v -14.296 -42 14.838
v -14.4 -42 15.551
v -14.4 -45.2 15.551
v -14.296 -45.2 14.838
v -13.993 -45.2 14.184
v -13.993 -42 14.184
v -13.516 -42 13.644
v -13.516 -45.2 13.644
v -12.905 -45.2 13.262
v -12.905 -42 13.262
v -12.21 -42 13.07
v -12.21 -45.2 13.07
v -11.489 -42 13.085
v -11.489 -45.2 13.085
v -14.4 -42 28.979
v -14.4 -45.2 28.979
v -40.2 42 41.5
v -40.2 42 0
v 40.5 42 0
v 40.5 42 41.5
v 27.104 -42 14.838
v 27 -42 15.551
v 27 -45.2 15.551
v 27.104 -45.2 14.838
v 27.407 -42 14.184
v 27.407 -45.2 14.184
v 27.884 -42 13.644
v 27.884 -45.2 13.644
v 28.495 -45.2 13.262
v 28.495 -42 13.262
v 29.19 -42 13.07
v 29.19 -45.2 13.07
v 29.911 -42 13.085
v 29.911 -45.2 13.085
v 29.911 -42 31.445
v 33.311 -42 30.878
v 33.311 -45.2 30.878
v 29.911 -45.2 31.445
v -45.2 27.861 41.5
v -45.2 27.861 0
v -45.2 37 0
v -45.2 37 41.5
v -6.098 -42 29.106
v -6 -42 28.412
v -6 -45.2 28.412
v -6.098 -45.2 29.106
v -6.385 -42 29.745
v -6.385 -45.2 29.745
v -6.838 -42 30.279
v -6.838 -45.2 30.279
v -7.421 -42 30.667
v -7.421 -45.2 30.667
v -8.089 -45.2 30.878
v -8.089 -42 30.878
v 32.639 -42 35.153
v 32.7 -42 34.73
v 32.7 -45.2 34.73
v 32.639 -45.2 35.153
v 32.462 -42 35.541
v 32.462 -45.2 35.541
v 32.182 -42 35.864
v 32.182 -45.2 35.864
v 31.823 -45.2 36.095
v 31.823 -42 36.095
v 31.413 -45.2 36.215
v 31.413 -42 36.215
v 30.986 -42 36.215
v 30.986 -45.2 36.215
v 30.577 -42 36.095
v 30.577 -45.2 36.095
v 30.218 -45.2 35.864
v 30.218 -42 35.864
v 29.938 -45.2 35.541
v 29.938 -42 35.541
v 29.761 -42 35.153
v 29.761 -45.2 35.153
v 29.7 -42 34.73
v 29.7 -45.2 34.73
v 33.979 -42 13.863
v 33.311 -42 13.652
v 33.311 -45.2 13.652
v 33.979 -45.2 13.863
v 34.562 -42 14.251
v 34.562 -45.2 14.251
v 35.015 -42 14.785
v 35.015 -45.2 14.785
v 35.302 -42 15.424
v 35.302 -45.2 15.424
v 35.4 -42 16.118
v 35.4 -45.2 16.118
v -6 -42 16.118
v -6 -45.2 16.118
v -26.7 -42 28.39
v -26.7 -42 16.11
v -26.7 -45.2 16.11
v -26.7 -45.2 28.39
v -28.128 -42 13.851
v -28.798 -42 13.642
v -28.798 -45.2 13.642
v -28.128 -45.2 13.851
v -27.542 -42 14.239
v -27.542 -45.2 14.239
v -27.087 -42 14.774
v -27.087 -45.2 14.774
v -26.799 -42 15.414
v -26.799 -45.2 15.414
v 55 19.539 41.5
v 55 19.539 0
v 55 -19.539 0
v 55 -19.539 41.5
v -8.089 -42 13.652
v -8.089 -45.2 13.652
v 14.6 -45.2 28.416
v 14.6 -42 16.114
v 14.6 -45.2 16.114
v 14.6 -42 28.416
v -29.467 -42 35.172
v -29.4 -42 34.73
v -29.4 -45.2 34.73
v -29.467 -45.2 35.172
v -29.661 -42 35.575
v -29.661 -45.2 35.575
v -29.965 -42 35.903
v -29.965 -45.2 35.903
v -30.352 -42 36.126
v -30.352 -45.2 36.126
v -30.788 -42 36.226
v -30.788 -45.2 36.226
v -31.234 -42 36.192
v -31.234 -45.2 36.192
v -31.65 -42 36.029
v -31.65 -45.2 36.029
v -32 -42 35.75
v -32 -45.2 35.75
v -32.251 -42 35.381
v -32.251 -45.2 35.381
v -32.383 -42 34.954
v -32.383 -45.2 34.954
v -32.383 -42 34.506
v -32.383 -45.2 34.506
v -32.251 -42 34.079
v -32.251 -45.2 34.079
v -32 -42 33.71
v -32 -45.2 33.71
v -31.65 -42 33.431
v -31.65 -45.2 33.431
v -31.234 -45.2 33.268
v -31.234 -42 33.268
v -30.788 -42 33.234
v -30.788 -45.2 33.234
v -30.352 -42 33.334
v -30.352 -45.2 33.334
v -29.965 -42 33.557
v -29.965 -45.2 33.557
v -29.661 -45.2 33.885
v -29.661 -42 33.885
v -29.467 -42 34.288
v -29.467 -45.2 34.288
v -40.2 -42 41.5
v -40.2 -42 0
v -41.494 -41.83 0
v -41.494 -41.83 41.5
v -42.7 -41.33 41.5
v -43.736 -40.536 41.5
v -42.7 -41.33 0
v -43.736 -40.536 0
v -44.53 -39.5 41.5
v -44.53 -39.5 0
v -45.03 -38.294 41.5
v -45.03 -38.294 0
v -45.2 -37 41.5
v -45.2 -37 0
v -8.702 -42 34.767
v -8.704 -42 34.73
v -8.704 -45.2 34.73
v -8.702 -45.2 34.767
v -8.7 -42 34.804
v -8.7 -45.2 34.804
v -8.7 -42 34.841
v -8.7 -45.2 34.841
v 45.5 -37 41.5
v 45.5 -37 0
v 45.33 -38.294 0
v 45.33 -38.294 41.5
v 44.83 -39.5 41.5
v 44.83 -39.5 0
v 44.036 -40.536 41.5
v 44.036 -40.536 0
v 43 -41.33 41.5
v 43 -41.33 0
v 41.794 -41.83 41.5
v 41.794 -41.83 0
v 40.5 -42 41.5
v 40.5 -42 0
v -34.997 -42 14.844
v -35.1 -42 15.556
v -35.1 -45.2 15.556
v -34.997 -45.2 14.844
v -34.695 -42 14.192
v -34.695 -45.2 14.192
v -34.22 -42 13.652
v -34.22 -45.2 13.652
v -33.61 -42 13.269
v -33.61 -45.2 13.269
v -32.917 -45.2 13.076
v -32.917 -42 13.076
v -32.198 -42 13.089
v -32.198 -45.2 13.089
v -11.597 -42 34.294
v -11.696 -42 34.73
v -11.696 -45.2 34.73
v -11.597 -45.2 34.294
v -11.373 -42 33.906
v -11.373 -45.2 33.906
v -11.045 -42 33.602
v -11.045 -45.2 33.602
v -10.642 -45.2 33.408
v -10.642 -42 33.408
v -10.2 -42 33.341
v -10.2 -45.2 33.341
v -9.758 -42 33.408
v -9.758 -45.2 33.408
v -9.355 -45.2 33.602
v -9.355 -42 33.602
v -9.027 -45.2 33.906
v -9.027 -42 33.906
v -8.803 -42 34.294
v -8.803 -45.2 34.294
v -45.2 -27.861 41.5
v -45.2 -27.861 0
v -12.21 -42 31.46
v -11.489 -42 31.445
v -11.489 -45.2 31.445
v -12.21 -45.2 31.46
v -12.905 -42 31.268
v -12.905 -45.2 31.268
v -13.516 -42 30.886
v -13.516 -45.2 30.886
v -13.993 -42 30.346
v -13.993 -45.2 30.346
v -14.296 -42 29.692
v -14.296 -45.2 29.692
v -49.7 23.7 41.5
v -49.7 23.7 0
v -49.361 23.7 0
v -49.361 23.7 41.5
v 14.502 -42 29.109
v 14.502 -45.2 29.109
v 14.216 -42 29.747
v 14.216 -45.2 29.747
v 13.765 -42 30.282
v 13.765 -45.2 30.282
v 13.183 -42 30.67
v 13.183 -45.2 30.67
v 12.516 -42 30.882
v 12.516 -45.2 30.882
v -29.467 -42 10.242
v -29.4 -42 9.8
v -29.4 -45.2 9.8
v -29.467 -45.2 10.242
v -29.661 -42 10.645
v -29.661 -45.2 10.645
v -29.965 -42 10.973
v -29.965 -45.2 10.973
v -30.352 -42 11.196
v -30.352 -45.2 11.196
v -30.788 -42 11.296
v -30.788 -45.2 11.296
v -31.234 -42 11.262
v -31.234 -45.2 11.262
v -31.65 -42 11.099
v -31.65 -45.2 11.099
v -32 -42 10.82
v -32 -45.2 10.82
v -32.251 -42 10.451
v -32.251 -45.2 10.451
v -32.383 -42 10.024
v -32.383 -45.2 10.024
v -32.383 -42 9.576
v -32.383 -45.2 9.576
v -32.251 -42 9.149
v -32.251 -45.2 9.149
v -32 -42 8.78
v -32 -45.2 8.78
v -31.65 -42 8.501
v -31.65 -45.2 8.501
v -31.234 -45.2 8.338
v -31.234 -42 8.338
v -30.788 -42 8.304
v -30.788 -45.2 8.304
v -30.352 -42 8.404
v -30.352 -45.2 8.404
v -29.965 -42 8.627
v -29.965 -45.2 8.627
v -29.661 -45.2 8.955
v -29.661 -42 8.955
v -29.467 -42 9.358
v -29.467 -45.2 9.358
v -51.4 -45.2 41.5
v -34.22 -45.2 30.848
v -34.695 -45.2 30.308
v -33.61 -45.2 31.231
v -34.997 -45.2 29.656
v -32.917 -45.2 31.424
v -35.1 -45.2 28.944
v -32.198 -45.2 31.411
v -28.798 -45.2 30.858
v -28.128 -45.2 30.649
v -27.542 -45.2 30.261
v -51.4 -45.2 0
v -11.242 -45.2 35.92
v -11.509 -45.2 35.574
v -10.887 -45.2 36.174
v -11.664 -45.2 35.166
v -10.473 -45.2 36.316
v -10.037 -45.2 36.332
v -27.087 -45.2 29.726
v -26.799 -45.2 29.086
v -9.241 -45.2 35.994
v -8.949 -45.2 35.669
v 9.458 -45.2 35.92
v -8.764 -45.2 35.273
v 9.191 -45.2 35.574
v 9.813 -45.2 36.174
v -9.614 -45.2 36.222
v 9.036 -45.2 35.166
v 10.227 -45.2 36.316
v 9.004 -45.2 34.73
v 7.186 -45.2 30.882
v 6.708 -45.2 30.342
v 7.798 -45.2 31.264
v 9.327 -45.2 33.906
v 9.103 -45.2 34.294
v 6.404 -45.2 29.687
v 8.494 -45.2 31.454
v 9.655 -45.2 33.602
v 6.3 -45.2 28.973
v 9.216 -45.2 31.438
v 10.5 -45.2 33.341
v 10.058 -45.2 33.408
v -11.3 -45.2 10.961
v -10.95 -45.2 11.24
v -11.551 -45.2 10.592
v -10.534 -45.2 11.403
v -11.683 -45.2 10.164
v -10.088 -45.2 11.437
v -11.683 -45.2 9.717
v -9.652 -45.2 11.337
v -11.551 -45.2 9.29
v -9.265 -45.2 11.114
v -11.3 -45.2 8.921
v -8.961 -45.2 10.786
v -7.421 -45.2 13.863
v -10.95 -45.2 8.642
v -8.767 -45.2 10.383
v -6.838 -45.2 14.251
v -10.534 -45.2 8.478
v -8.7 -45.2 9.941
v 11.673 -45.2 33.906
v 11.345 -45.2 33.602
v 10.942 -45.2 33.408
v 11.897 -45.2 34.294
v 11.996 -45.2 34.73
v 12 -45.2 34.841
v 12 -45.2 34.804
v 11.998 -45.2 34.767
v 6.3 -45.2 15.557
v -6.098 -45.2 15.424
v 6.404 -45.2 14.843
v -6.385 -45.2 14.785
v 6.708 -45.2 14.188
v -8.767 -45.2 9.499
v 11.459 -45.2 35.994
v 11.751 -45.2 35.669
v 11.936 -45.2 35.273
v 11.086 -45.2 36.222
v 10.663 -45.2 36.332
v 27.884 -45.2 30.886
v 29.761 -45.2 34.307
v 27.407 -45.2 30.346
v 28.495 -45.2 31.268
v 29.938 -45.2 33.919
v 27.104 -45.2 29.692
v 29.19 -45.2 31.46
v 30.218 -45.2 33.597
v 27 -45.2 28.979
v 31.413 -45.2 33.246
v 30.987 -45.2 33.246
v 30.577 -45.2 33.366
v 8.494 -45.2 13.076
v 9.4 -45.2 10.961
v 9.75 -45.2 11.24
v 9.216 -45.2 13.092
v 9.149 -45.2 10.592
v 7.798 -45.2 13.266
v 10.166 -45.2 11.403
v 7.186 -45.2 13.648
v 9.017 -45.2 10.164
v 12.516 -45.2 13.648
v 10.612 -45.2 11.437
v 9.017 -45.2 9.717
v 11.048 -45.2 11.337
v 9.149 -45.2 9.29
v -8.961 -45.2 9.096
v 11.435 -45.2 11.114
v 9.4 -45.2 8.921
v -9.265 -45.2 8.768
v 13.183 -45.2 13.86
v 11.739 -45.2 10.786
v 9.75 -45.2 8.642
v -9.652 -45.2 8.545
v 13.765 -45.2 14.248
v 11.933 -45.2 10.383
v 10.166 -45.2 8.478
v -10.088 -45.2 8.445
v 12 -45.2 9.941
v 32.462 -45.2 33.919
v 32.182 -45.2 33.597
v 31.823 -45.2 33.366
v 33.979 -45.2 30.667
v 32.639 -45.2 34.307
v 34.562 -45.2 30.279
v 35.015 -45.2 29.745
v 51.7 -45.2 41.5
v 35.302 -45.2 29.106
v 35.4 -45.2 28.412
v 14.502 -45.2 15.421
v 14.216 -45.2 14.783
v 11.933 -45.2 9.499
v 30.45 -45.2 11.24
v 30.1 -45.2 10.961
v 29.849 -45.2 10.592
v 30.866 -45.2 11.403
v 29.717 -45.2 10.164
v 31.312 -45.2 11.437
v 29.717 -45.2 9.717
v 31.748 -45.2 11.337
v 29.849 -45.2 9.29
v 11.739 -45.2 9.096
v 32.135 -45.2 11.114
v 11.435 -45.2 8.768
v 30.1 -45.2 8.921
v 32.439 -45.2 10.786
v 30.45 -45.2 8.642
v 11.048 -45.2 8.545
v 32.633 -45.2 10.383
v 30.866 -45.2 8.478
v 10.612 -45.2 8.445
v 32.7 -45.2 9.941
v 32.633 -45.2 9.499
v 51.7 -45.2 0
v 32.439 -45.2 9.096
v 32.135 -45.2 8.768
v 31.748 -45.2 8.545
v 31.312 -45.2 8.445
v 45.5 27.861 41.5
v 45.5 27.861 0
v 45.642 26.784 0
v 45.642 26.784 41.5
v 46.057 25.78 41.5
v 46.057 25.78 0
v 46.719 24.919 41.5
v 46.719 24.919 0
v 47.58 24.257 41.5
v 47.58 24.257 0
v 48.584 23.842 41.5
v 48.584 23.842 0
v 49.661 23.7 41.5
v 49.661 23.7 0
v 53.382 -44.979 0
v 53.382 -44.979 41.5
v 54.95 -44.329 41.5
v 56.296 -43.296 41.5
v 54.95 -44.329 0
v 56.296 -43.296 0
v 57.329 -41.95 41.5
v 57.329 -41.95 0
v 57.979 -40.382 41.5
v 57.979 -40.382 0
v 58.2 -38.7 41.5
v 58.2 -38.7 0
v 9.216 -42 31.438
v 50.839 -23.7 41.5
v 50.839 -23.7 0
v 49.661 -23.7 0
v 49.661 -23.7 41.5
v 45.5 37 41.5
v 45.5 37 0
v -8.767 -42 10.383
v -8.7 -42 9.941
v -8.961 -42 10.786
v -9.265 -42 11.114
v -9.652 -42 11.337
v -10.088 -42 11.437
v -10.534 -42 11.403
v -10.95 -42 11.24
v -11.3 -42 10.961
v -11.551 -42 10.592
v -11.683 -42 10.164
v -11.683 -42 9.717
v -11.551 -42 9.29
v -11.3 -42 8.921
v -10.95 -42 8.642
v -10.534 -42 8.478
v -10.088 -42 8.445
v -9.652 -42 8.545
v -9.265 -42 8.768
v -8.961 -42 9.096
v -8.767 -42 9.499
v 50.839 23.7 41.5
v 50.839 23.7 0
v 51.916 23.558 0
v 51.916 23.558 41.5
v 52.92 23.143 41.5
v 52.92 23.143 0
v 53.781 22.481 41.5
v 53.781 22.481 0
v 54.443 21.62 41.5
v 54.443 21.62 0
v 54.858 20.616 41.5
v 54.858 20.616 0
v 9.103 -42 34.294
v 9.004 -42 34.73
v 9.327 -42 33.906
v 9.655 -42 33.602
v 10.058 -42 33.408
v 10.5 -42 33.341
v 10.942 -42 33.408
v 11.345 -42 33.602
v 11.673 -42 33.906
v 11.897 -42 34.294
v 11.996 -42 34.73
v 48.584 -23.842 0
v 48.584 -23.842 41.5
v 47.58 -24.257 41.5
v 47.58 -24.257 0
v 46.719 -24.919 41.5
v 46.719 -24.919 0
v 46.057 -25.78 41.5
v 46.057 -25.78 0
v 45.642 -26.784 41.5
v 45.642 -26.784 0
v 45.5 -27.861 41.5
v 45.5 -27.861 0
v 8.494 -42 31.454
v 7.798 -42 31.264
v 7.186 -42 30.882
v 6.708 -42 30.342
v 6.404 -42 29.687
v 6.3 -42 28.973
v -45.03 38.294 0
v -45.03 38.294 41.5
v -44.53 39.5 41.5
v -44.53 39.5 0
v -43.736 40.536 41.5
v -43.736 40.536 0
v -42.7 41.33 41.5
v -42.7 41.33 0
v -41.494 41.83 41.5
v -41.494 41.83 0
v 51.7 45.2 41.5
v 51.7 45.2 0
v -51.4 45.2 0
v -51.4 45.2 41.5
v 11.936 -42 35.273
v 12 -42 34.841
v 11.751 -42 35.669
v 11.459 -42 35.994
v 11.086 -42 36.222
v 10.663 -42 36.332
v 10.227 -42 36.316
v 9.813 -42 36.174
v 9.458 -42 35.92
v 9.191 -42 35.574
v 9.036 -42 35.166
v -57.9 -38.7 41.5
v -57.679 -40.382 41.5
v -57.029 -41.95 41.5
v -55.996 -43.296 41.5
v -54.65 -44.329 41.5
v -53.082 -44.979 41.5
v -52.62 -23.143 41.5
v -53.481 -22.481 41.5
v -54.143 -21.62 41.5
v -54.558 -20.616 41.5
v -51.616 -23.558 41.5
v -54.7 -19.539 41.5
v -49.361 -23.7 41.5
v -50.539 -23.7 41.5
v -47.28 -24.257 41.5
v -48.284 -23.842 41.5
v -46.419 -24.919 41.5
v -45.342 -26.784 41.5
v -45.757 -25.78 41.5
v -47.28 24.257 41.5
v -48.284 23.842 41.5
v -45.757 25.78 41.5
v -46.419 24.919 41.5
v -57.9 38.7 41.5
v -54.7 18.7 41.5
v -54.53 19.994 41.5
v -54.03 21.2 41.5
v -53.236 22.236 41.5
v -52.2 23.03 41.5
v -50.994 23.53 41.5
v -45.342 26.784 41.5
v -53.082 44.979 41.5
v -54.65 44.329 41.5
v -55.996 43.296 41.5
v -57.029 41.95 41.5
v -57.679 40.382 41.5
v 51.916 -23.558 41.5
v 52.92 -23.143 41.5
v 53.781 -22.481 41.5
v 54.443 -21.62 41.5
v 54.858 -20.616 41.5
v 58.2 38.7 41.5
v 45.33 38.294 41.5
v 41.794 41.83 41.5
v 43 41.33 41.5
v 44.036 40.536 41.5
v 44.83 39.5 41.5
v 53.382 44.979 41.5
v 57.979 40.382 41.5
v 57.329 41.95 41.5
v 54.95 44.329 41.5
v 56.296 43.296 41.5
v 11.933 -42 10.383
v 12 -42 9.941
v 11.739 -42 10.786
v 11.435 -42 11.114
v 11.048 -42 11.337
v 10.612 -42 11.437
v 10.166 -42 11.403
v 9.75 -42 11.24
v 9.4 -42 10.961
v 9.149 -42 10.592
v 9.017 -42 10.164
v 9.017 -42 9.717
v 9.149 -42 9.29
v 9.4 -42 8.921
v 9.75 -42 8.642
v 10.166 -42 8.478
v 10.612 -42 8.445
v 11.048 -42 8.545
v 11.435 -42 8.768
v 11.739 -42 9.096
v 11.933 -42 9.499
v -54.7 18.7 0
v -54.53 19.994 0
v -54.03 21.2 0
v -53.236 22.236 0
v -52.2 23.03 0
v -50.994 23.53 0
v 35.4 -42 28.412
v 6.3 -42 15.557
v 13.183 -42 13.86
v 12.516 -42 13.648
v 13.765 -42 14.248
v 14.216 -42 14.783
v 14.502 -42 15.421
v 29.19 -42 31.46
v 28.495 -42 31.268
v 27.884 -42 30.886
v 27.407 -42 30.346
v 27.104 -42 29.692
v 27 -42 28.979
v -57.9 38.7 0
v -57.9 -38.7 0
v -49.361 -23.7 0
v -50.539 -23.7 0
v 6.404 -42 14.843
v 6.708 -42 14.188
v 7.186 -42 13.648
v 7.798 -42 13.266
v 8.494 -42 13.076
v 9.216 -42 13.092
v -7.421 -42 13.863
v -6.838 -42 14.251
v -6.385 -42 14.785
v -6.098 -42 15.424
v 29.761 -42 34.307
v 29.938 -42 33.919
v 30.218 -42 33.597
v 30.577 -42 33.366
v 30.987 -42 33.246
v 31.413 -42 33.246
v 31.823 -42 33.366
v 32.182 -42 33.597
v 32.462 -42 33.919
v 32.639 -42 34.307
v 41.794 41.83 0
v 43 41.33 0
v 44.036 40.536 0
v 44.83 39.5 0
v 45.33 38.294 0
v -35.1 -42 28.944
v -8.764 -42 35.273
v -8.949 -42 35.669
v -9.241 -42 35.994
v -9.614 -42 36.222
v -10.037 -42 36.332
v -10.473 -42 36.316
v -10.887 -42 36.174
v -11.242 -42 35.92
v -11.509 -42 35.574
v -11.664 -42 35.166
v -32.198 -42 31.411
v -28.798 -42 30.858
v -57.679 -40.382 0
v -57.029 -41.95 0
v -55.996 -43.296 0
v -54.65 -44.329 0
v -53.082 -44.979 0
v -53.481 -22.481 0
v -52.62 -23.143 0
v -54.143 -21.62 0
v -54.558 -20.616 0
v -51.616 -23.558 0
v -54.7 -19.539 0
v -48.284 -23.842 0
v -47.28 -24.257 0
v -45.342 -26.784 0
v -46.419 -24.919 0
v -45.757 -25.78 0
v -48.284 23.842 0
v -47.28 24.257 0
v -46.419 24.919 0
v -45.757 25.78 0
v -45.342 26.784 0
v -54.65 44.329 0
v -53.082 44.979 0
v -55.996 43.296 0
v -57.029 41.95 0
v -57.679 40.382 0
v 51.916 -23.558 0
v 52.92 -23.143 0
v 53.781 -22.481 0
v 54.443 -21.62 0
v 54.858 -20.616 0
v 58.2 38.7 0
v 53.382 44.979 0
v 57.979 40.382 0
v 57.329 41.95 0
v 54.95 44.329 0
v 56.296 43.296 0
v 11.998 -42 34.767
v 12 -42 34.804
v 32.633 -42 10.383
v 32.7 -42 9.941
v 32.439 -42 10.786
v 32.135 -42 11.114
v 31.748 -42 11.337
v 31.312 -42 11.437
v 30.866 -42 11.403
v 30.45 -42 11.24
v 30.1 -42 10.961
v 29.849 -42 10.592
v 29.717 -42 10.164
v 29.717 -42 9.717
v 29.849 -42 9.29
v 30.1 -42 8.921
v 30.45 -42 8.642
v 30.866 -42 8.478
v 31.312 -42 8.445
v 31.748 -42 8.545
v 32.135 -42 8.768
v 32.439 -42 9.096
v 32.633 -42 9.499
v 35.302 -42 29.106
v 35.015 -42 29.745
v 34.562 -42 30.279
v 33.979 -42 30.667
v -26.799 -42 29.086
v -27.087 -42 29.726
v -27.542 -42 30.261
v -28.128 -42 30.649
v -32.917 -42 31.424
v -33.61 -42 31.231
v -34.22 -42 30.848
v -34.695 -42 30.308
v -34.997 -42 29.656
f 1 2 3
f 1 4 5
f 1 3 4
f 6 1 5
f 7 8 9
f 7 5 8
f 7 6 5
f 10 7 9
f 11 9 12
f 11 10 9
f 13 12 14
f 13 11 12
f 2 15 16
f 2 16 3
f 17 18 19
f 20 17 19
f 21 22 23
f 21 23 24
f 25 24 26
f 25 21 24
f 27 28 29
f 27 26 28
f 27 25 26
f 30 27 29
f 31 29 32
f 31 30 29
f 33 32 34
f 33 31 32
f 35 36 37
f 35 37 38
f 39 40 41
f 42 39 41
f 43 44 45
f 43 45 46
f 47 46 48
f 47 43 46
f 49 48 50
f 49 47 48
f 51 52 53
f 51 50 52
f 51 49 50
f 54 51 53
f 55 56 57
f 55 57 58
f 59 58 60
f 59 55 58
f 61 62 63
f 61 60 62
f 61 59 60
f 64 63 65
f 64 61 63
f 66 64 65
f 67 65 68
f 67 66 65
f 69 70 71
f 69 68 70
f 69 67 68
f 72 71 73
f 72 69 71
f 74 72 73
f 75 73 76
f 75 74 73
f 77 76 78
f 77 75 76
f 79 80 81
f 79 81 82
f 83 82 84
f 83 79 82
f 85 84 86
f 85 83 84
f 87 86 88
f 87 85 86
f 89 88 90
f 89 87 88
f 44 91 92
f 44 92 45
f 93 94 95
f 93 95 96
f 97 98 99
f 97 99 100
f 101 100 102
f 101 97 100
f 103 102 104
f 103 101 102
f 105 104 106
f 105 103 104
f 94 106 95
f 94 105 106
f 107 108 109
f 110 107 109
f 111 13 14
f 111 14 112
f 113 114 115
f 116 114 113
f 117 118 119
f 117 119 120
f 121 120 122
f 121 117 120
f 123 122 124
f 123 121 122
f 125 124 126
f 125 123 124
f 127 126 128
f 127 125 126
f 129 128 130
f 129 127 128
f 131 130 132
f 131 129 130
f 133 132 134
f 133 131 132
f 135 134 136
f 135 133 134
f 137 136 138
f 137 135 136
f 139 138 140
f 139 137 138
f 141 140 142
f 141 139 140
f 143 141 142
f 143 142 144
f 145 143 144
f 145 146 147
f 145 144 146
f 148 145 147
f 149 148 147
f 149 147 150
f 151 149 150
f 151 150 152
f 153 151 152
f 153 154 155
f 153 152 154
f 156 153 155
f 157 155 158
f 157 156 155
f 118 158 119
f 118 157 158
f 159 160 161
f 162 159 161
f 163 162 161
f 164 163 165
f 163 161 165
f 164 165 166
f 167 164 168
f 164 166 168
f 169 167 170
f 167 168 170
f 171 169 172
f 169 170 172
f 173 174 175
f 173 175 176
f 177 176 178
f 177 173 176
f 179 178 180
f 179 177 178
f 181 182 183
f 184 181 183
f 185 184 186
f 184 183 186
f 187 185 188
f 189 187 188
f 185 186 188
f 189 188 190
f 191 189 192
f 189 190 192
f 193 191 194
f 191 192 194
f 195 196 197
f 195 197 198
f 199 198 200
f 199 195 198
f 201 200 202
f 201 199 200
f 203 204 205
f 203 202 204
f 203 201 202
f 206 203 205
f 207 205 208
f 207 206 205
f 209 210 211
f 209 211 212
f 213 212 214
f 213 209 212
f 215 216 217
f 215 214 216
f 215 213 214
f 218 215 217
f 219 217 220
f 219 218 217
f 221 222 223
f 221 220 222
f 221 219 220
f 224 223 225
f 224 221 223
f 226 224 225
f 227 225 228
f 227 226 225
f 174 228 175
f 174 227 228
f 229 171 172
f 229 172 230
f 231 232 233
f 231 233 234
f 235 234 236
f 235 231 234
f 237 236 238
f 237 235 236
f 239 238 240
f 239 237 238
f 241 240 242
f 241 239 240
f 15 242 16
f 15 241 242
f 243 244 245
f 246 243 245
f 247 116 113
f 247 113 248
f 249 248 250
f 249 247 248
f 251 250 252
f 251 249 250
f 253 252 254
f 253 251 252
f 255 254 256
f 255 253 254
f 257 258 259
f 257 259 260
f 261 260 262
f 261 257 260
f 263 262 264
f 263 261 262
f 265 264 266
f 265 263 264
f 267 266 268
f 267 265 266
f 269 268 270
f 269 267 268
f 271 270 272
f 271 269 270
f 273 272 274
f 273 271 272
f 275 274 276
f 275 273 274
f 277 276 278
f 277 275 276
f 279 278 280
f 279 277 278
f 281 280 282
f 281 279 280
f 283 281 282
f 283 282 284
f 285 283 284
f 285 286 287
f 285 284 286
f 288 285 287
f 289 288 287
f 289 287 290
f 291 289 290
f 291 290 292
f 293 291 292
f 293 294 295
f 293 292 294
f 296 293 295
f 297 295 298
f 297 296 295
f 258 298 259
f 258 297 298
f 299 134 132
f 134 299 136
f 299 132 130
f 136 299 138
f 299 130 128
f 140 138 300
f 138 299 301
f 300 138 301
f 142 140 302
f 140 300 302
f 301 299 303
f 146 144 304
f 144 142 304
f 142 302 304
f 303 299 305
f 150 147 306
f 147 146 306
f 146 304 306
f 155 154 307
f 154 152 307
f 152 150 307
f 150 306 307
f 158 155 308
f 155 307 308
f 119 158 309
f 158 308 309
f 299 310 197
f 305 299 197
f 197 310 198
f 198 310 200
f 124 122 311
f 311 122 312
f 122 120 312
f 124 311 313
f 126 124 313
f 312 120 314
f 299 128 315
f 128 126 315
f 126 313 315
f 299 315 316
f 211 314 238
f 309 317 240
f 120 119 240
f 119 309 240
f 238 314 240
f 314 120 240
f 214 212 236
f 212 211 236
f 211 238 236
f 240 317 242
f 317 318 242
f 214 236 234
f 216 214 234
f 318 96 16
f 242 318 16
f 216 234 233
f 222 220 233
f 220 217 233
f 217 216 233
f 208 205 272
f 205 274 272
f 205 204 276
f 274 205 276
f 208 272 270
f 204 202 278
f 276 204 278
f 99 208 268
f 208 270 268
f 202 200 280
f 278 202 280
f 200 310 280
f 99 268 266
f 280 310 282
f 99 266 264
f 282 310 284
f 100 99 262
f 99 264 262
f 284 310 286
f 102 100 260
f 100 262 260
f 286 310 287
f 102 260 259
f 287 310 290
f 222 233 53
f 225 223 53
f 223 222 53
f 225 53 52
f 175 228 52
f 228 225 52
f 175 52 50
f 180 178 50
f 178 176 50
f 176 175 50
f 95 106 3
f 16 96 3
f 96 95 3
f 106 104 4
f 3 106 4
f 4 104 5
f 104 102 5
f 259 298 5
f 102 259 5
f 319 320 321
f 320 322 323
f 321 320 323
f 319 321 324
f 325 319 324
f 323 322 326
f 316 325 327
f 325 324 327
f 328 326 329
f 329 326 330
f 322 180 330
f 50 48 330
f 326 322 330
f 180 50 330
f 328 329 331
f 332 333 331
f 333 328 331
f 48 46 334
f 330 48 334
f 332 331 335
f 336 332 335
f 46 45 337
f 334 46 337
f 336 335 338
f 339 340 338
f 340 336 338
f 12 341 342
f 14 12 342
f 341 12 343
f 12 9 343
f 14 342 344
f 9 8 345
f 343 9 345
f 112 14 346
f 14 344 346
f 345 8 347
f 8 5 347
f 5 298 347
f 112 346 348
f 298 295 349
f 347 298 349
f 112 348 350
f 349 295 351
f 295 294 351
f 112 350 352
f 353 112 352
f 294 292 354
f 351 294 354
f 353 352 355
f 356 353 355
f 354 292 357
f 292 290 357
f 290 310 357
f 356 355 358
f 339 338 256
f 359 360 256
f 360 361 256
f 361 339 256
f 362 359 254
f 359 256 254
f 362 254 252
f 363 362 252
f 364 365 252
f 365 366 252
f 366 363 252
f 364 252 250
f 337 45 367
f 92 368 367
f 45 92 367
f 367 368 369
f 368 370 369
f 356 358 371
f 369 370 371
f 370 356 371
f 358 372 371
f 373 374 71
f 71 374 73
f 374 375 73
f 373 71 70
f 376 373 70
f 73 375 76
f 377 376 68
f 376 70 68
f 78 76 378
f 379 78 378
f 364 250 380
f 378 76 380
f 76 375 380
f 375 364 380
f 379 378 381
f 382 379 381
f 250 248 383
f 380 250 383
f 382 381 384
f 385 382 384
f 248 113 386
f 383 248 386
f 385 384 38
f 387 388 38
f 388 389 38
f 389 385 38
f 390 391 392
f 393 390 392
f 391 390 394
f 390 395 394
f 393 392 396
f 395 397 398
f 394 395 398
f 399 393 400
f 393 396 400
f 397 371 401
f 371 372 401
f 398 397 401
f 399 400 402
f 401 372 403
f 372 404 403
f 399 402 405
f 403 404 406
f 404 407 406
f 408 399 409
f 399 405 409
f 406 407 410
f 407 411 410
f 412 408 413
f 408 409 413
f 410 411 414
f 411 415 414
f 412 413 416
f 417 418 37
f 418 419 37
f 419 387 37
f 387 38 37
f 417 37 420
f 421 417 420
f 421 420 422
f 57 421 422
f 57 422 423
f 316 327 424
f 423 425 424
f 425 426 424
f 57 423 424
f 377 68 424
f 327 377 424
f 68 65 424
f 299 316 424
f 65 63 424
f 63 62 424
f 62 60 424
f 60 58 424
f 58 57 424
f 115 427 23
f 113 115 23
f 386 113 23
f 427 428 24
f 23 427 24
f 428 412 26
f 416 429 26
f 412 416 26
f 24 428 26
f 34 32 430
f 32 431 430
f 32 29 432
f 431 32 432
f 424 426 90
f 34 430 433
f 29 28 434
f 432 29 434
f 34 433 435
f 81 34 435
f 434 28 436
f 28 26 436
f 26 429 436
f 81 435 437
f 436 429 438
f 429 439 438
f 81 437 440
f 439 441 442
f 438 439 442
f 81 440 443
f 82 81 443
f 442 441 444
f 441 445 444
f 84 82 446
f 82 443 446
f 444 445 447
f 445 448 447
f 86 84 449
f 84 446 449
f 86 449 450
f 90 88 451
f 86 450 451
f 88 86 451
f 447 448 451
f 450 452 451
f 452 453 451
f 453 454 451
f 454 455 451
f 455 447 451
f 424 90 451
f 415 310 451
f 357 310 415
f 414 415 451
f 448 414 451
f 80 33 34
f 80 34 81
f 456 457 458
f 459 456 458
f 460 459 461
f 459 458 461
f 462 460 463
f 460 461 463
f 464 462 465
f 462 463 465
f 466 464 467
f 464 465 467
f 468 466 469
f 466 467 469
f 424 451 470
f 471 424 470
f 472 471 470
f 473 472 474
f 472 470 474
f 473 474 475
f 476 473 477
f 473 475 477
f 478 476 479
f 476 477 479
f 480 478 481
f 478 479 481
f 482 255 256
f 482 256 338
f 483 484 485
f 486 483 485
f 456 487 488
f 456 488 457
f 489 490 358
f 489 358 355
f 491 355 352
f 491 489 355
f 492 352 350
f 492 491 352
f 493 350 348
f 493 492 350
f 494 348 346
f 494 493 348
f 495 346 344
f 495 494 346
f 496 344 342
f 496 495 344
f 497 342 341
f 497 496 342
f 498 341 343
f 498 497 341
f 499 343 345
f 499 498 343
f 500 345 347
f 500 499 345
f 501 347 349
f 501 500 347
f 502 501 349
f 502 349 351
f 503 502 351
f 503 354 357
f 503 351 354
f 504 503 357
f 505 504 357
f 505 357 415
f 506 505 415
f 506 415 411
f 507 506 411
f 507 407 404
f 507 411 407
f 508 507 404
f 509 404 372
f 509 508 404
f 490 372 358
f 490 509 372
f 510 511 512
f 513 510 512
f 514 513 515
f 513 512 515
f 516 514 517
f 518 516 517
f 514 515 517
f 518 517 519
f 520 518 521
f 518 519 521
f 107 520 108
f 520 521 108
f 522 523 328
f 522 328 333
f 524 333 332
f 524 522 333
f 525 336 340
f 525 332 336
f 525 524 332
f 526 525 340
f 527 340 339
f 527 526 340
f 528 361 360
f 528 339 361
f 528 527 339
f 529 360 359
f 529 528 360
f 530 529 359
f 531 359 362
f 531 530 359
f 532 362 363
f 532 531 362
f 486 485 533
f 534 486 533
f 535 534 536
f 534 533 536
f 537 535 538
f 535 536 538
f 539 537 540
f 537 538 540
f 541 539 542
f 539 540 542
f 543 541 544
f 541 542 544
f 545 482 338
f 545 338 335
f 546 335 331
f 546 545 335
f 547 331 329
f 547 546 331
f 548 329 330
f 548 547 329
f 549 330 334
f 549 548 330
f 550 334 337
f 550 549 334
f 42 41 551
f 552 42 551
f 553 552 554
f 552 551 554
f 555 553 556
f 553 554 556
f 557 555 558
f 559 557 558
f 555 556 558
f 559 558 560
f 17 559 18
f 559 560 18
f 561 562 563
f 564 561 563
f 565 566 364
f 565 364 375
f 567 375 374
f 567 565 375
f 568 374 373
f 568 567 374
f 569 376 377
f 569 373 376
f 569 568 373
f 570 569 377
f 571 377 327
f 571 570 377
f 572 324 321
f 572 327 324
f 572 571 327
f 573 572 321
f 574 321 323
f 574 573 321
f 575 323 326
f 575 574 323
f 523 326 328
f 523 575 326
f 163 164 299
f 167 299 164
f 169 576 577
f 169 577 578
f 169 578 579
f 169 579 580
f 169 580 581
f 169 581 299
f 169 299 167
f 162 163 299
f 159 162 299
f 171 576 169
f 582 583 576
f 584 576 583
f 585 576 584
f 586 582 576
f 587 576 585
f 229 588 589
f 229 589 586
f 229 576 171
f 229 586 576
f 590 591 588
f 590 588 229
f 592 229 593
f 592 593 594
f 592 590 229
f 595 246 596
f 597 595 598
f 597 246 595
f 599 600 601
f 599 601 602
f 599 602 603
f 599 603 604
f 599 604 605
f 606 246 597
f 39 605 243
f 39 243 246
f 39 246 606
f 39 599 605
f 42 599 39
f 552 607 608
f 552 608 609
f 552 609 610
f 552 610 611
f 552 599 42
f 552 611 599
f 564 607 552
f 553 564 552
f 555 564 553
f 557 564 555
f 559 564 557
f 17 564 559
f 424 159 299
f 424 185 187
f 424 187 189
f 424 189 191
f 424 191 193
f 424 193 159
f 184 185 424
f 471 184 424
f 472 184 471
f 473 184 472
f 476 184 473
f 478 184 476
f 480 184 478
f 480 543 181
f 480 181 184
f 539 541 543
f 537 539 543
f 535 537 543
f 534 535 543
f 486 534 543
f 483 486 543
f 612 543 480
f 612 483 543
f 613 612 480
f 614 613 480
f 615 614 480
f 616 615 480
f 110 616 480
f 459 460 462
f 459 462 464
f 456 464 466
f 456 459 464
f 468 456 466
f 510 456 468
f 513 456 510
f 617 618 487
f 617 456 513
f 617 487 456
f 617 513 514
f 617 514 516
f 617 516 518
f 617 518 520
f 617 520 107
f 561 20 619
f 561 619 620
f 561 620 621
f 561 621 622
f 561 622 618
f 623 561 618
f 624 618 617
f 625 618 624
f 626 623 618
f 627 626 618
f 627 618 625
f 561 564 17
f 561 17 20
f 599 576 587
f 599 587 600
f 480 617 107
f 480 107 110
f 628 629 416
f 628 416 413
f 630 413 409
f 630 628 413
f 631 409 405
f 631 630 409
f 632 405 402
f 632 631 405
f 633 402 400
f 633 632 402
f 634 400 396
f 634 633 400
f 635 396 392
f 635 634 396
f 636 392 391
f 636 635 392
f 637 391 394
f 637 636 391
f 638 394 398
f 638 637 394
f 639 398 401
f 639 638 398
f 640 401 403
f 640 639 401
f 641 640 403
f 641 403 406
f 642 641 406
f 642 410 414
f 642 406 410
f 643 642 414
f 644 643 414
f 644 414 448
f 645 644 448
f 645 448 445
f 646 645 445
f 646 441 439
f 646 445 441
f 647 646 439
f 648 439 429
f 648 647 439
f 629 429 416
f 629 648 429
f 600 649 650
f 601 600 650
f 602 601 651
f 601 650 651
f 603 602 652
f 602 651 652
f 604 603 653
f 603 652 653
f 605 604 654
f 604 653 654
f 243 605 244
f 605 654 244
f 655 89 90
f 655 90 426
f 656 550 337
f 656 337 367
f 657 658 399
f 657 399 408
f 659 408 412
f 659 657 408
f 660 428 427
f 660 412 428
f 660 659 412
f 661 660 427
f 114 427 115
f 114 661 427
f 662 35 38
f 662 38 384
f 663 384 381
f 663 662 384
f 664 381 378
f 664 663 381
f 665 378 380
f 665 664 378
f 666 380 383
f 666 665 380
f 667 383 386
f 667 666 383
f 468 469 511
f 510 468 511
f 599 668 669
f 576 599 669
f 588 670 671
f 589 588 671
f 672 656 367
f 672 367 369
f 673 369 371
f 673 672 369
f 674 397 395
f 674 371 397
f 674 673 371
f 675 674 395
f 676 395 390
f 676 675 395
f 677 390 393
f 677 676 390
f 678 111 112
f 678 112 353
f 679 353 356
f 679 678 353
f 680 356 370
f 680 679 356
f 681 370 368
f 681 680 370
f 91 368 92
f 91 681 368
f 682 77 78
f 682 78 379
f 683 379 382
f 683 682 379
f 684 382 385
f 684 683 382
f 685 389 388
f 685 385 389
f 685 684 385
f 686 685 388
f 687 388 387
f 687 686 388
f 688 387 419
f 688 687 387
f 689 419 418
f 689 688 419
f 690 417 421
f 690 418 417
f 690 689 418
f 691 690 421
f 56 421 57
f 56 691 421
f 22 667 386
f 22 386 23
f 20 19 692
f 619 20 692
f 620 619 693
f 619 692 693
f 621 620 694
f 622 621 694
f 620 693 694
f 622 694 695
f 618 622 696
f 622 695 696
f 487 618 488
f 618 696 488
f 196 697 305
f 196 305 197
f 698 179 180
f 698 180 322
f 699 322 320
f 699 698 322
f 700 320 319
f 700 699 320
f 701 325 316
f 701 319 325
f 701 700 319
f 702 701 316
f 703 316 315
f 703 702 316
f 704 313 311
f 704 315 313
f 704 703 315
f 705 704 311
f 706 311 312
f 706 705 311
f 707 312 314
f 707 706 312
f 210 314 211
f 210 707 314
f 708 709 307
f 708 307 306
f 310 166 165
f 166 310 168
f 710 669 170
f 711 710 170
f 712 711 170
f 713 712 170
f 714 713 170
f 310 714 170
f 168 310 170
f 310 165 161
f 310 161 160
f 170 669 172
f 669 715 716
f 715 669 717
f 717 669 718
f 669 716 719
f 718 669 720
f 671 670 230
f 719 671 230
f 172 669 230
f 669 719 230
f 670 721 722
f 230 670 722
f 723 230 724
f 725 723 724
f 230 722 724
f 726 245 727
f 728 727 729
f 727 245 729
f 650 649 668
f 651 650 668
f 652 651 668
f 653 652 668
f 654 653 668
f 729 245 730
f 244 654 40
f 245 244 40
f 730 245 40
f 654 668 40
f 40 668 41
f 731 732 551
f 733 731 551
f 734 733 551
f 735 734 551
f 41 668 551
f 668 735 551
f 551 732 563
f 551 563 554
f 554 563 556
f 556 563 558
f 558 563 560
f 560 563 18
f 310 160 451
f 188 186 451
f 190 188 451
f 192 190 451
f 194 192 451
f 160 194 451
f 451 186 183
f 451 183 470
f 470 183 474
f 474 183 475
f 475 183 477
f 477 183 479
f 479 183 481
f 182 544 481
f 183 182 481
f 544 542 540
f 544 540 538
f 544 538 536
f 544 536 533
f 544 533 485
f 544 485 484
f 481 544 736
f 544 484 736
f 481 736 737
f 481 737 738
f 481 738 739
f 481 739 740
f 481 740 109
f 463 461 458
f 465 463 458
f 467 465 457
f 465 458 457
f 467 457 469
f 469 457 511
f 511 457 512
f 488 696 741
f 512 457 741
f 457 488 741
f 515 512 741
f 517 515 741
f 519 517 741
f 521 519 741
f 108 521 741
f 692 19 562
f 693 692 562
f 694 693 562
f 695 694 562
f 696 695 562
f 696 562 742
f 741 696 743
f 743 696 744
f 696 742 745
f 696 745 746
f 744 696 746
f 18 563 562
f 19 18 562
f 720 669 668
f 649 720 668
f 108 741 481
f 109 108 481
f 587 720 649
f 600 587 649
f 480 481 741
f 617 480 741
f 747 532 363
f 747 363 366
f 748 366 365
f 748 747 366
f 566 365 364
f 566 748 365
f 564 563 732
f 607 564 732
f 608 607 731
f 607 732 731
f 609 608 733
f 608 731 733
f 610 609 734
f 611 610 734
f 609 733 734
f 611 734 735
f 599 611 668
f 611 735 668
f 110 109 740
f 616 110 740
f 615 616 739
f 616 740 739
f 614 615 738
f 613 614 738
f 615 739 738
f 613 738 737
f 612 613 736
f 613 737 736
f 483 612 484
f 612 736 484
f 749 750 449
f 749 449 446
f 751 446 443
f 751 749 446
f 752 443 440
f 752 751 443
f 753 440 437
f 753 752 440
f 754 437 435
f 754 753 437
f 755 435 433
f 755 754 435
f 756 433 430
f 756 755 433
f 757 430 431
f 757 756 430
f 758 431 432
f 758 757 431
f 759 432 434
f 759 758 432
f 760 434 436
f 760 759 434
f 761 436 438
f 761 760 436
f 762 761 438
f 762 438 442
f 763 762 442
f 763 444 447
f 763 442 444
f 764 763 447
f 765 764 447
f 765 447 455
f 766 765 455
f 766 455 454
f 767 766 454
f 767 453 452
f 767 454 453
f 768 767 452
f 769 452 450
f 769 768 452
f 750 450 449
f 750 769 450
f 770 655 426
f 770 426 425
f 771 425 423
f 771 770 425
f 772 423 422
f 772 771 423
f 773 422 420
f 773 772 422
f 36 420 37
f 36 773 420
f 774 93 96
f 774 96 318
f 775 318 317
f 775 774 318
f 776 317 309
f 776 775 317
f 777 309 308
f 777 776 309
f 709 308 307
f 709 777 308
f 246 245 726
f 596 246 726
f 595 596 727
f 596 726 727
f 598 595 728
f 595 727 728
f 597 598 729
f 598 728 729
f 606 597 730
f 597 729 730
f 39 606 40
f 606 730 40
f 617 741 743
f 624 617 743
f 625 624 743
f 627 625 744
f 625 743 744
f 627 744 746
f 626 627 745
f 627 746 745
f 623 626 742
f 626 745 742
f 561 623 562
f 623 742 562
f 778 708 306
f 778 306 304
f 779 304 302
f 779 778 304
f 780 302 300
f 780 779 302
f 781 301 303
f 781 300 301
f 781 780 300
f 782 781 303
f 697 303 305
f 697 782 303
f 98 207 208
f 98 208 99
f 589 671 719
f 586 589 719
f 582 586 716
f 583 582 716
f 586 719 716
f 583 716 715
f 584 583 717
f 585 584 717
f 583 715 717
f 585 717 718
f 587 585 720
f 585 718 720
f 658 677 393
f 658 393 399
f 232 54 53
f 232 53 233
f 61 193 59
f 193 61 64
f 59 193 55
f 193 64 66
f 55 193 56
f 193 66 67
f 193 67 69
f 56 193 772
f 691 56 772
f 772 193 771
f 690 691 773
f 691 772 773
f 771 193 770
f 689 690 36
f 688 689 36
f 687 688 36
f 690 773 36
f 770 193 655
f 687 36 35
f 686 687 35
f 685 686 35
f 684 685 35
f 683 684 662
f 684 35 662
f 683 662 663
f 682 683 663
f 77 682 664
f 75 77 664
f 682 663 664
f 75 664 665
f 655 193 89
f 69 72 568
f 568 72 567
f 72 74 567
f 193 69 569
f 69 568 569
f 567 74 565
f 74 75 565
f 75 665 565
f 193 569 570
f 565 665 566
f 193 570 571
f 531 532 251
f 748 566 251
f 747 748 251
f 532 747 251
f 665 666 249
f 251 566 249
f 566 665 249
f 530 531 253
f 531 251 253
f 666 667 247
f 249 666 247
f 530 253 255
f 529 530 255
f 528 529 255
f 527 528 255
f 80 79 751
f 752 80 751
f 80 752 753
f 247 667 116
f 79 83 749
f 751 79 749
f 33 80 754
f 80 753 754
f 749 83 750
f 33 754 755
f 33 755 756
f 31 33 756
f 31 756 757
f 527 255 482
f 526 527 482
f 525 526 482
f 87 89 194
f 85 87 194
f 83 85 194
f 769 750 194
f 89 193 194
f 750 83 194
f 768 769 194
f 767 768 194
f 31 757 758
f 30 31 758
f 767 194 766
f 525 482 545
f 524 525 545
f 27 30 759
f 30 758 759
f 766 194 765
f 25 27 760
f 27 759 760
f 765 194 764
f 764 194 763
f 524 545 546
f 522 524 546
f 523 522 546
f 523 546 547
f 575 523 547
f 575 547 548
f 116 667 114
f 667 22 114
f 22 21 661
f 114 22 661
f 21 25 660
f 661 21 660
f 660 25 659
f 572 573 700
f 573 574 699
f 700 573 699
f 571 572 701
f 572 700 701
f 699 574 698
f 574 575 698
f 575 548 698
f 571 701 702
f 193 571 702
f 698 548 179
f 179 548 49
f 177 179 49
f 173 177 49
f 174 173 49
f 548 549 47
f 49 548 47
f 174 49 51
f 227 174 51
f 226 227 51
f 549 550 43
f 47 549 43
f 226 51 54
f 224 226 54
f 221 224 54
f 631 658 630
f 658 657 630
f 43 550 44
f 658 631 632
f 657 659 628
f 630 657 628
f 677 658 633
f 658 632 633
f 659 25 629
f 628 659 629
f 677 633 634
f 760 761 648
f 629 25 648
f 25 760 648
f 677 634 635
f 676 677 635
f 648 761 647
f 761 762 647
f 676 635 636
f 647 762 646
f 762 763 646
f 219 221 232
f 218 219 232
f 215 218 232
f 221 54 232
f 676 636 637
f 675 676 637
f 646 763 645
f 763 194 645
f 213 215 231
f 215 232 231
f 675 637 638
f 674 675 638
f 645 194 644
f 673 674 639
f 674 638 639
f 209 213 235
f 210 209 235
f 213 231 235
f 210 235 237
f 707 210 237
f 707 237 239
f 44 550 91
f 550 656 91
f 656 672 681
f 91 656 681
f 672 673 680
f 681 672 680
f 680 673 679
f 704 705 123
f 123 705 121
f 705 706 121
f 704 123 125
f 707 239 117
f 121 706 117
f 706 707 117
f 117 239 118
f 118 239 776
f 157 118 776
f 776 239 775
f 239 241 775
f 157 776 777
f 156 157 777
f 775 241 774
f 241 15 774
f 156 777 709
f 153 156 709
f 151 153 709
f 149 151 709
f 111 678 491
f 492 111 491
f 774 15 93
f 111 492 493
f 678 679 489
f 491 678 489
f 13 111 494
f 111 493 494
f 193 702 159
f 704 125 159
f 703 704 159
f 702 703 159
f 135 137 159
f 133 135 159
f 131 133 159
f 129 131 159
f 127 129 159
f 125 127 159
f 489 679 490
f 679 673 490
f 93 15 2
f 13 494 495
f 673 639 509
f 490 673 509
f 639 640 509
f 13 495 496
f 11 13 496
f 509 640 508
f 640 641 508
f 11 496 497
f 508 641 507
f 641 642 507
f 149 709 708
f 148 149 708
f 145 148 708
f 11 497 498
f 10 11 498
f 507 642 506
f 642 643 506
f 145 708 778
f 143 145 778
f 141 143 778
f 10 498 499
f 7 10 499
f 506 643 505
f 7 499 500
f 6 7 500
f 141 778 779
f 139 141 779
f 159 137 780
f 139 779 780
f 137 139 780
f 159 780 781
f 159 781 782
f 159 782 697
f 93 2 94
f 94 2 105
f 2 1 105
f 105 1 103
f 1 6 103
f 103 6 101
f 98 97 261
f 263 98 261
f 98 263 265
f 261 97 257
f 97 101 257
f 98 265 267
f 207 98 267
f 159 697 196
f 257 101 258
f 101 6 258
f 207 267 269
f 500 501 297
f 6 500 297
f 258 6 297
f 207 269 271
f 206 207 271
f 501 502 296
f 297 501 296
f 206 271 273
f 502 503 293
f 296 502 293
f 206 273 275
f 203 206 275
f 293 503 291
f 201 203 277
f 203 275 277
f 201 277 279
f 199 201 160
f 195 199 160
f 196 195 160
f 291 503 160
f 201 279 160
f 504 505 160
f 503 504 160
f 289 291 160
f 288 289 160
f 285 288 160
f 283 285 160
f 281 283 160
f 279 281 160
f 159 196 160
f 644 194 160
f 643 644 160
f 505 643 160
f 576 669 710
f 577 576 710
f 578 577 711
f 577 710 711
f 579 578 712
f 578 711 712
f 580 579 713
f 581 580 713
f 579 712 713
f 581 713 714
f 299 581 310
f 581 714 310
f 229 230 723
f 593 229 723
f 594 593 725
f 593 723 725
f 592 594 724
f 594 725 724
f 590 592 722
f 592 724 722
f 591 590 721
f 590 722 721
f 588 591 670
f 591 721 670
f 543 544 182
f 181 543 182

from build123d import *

# Parameters (mm, degrees)
F1_DEPTH = 41.5
F2_R     = 1.5
F3_DEPTH = 103


with BuildPart() as f1:
    # F0 (on Top) → F1 (new body)
    with BuildSketch(Plane.XY):
        with BuildLine():
            Line((51.7, 45.2), (-51.4, 45.2))
            ThreePointArc((-51.4, 45.2), (-55.9961940777, 43.2961940777), (-57.9, 38.7))
            Line((-57.9, 38.7), (-57.9, -38.7))
            ThreePointArc((-57.9, -38.7), (-55.9961940777, -43.2961940777), (-51.4, -45.2))
            Line((-51.4, -45.2), (51.7, -45.2))
            ThreePointArc((51.7, -45.2), (56.2961940777, -43.2961940777), (58.2, -38.7))
            Line((58.2, -38.7), (58.2, 38.7))
            ThreePointArc((58.2, 38.7), (56.2961940777, 43.2961940777), (51.7, 45.2))
        make_face()
        with BuildLine():
            Line((-54.7, -19.5394540004), (-54.7, 18.7))
            ThreePointArc((-54.7, 18.7), (-53.2355339059, 22.2355339059), (-49.7, 23.7))
            Line((-49.7, 23.7), (-49.3605459996, 23.7))
            ThreePointArc((-49.3605459996, 23.7), (-46.4185957098, 24.9185957098), (-45.2, 27.8605459996))
            Line((-45.2, 27.8605459996), (-45.2, 37))
            ThreePointArc((-45.2, 37), (-43.7355339059, 40.5355339059), (-40.2, 42))
            Line((-40.2, 42), (40.5, 42))
            ThreePointArc((40.5, 42), (44.0355339059, 40.5355339059), (45.5, 37))
            Line((45.5, 37), (45.5, 27.8605459996))
            ThreePointArc((45.5, 27.8605459996), (46.7185957098, 24.9185957098), (49.6605459996, 23.7))
            Line((49.6605459996, 23.7), (50.8394540004, 23.7))
            ThreePointArc((50.8394540004, 23.7), (53.7814042902, 22.4814042902), (55, 19.5394540004))
            Line((55, 19.5394540004), (55, -19.5394540004))
            ThreePointArc((55, -19.5394540004), (53.7814042902, -22.4814042902), (50.8394540004, -23.7))
            Line((50.8394540004, -23.7), (49.6605459996, -23.7))
            ThreePointArc((49.6605459996, -23.7), (46.7185957098, -24.9185957098), (45.5, -27.8605459996))
            Line((45.5, -27.8605459996), (45.5, -37))
            ThreePointArc((45.5, -37), (44.0355339059, -40.5355339059), (40.5, -42))
            Line((40.5, -42), (-40.2, -42))
            ThreePointArc((-40.2, -42), (-43.7355339059, -40.5355339059), (-45.2, -37))
            Line((-45.2, -37), (-45.2, -27.8605459996))
            ThreePointArc((-45.2, -27.8605459996), (-46.4185957098, -24.9185957098), (-49.3605459996, -23.7))
            Line((-49.3605459996, -23.7), (-50.5394540004, -23.7))
            ThreePointArc((-50.5394540004, -23.7), (-53.4814042902, -22.4814042902), (-54.7, -19.5394540004))
        make_face(mode=Mode.SUBTRACT)
    extrude(amount=F1_DEPTH)

    # F2 (on Front) → F3 (cut)
    with BuildSketch(Plane.XZ):
        with Locations((-30.9, 34.73)):
            Circle(F2_R)
        with BuildLine():
            ThreePointArc((32.7, 34.7302867395), (31.1998566303, 36.2302867326), (29.7000000274, 34.73))
            Line((29.7000000274, 34.73), (32.6999999726, 34.73))
            ThreePointArc((32.6999999726, 34.73), (32.6999999931, 34.7301433697), (32.7, 34.7302867395))
        make_face()
        with BuildLine():
            Line((32.6999999726, 34.73), (29.7000000274, 34.73))
            ThreePointArc((29.7000000274, 34.73), (31.2, 33.2302867395), (32.6999999726, 34.73))
        make_face()
        with BuildLine():
            ThreePointArc((12, 34.8408361703), (10.4445440024, 36.3398106972), (9.0041004902, 34.73))
            Line((9.0041004902, 34.73), (11.9958995098, 34.73))
            ThreePointArc((11.9958995098, 34.73), (11.9989745269, 34.7853801727), (12, 34.8408361703))
        make_face()
        with BuildLine():
            Line((11.9958995098, 34.73), (9.0041004902, 34.73))
            ThreePointArc((9.0041004902, 34.73), (10.5, 33.3408361703), (11.9958995098, 34.73))
        make_face()
        with BuildLine():
            ThreePointArc((-8.7, 34.8408361703), (-10.2554559976, 36.3398106972), (-11.6958995098, 34.73))
            Line((-11.6958995098, 34.73), (-8.7041004902, 34.73))
            ThreePointArc((-8.7041004902, 34.73), (-8.7010254731, 34.7853801727), (-8.7, 34.8408361703))
        make_face()
        with BuildLine():
            Line((-8.7041004902, 34.73), (-11.6958995098, 34.73))
            ThreePointArc((-11.6958995098, 34.73), (-10.2, 33.3408361703), (-8.7041004902, 34.73))
        make_face()
        with Locations((-30.9, 9.8)):
            Circle(F2_R)
        with Locations((31.2, 9.9408361703)):
            Circle(F2_R)
        with Locations((10.5, 9.9408361703)):
            Circle(F2_R)
        with Locations((-10.2, 9.9408361703)):
            Circle(F2_R)
        with BuildLine():
            Line((-35.1, 28.9438347778), (-35.1, 15.5561652222))
            ThreePointArc((-35.1, 15.5561652222), (-34.2195334956, 13.6516675833), (-32.1983109948, 13.0886470474))
            Line((-32.1983109948, 13.0886470474), (-28.7983109948, 13.6421354195))
            ThreePointArc((-28.7983109948, 13.6421354195), (-27.2955023611, 14.4901200986), (-26.7, 16.1096535943))
            Line((-26.7, 16.1096535943), (-26.7, 28.3903464057))
            ThreePointArc((-26.7, 28.3903464057), (-27.2955023611, 30.0098799014), (-28.7983109948, 30.8578645805))
            Line((-28.7983109948, 30.8578645805), (-32.1983109948, 31.4113529526))
            ThreePointArc((-32.1983109948, 31.4113529526), (-34.2195334956, 30.8483324167), (-35.1, 28.9438347778))
        make_face()
        with BuildLine():
            Line((-14.4, 28.9788489457), (-14.4, 15.5511510543))
            ThreePointArc((-14.4, 15.5511510543), (-13.5159372403, 13.6436010981), (-11.4890025317, 13.0851662447))
            Line((-11.4890025317, 13.0851662447), (-8.0890025317, 13.6518329114))
            ThreePointArc((-8.0890025317, 13.6518329114), (-6.5924500438, 14.5018804806), (-6, 16.117817721))
            Line((-6, 16.117817721), (-6, 28.412182279))
            ThreePointArc((-6, 28.412182279), (-6.5924500438, 30.0281195194), (-8.0890025317, 30.8781670886))
            Line((-8.0890025317, 30.8781670886), (-11.4890025317, 31.4448337553))
            ThreePointArc((-11.4890025317, 31.4448337553), (-13.5159372403, 30.8863989019), (-14.4, 28.9788489457))
        make_face()
        with BuildLine():
            Line((6.3, 28.9729987336), (6.3, 15.5570012664))
            ThreePointArc((6.3, 15.5570012664), (7.1859263693, 13.6478741584), (9.2158130517, 13.0918238882))
            Line((9.2158130517, 13.0918238882), (12.5158130517, 13.6484503943))
            ThreePointArc((12.5158130517, 13.6484503943), (14.009127108, 14.4995541418), (14.6, 16.1136277725))
            Line((14.6, 16.1136277725), (14.6, 28.4163722275))
            ThreePointArc((14.6, 28.4163722275), (14.009127108, 30.0304458582), (12.5158130517, 30.8815496057))
            Line((12.5158130517, 30.8815496057), (9.2158130517, 31.4381761118))
            ThreePointArc((9.2158130517, 31.4381761118), (7.1859263693, 30.8821258416), (6.3, 28.9729987336))
        make_face()
        with BuildLine():
            Line((27, 28.9788489457), (27, 15.5511510543))
            ThreePointArc((27, 15.5511510543), (27.8840627597, 13.6436010981), (29.9109974683, 13.0851662447))
            Line((29.9109974683, 13.0851662447), (33.3109974683, 13.6518329114))
            ThreePointArc((33.3109974683, 13.6518329114), (34.8075499562, 14.5018804806), (35.4, 16.117817721))
            Line((35.4, 16.117817721), (35.4, 28.412182279))
            ThreePointArc((35.4, 28.412182279), (34.8075499562, 30.0281195194), (33.3109974683, 30.8781670886))
            Line((33.3109974683, 30.8781670886), (29.9109974683, 31.4448337553))
            ThreePointArc((29.9109974683, 31.4448337553), (27.8840627597, 30.8863989019), (27, 28.9788489457))
        make_face()
    extrude(amount=F3_DEPTH, mode=Mode.SUBTRACT)


solid = f1.part
